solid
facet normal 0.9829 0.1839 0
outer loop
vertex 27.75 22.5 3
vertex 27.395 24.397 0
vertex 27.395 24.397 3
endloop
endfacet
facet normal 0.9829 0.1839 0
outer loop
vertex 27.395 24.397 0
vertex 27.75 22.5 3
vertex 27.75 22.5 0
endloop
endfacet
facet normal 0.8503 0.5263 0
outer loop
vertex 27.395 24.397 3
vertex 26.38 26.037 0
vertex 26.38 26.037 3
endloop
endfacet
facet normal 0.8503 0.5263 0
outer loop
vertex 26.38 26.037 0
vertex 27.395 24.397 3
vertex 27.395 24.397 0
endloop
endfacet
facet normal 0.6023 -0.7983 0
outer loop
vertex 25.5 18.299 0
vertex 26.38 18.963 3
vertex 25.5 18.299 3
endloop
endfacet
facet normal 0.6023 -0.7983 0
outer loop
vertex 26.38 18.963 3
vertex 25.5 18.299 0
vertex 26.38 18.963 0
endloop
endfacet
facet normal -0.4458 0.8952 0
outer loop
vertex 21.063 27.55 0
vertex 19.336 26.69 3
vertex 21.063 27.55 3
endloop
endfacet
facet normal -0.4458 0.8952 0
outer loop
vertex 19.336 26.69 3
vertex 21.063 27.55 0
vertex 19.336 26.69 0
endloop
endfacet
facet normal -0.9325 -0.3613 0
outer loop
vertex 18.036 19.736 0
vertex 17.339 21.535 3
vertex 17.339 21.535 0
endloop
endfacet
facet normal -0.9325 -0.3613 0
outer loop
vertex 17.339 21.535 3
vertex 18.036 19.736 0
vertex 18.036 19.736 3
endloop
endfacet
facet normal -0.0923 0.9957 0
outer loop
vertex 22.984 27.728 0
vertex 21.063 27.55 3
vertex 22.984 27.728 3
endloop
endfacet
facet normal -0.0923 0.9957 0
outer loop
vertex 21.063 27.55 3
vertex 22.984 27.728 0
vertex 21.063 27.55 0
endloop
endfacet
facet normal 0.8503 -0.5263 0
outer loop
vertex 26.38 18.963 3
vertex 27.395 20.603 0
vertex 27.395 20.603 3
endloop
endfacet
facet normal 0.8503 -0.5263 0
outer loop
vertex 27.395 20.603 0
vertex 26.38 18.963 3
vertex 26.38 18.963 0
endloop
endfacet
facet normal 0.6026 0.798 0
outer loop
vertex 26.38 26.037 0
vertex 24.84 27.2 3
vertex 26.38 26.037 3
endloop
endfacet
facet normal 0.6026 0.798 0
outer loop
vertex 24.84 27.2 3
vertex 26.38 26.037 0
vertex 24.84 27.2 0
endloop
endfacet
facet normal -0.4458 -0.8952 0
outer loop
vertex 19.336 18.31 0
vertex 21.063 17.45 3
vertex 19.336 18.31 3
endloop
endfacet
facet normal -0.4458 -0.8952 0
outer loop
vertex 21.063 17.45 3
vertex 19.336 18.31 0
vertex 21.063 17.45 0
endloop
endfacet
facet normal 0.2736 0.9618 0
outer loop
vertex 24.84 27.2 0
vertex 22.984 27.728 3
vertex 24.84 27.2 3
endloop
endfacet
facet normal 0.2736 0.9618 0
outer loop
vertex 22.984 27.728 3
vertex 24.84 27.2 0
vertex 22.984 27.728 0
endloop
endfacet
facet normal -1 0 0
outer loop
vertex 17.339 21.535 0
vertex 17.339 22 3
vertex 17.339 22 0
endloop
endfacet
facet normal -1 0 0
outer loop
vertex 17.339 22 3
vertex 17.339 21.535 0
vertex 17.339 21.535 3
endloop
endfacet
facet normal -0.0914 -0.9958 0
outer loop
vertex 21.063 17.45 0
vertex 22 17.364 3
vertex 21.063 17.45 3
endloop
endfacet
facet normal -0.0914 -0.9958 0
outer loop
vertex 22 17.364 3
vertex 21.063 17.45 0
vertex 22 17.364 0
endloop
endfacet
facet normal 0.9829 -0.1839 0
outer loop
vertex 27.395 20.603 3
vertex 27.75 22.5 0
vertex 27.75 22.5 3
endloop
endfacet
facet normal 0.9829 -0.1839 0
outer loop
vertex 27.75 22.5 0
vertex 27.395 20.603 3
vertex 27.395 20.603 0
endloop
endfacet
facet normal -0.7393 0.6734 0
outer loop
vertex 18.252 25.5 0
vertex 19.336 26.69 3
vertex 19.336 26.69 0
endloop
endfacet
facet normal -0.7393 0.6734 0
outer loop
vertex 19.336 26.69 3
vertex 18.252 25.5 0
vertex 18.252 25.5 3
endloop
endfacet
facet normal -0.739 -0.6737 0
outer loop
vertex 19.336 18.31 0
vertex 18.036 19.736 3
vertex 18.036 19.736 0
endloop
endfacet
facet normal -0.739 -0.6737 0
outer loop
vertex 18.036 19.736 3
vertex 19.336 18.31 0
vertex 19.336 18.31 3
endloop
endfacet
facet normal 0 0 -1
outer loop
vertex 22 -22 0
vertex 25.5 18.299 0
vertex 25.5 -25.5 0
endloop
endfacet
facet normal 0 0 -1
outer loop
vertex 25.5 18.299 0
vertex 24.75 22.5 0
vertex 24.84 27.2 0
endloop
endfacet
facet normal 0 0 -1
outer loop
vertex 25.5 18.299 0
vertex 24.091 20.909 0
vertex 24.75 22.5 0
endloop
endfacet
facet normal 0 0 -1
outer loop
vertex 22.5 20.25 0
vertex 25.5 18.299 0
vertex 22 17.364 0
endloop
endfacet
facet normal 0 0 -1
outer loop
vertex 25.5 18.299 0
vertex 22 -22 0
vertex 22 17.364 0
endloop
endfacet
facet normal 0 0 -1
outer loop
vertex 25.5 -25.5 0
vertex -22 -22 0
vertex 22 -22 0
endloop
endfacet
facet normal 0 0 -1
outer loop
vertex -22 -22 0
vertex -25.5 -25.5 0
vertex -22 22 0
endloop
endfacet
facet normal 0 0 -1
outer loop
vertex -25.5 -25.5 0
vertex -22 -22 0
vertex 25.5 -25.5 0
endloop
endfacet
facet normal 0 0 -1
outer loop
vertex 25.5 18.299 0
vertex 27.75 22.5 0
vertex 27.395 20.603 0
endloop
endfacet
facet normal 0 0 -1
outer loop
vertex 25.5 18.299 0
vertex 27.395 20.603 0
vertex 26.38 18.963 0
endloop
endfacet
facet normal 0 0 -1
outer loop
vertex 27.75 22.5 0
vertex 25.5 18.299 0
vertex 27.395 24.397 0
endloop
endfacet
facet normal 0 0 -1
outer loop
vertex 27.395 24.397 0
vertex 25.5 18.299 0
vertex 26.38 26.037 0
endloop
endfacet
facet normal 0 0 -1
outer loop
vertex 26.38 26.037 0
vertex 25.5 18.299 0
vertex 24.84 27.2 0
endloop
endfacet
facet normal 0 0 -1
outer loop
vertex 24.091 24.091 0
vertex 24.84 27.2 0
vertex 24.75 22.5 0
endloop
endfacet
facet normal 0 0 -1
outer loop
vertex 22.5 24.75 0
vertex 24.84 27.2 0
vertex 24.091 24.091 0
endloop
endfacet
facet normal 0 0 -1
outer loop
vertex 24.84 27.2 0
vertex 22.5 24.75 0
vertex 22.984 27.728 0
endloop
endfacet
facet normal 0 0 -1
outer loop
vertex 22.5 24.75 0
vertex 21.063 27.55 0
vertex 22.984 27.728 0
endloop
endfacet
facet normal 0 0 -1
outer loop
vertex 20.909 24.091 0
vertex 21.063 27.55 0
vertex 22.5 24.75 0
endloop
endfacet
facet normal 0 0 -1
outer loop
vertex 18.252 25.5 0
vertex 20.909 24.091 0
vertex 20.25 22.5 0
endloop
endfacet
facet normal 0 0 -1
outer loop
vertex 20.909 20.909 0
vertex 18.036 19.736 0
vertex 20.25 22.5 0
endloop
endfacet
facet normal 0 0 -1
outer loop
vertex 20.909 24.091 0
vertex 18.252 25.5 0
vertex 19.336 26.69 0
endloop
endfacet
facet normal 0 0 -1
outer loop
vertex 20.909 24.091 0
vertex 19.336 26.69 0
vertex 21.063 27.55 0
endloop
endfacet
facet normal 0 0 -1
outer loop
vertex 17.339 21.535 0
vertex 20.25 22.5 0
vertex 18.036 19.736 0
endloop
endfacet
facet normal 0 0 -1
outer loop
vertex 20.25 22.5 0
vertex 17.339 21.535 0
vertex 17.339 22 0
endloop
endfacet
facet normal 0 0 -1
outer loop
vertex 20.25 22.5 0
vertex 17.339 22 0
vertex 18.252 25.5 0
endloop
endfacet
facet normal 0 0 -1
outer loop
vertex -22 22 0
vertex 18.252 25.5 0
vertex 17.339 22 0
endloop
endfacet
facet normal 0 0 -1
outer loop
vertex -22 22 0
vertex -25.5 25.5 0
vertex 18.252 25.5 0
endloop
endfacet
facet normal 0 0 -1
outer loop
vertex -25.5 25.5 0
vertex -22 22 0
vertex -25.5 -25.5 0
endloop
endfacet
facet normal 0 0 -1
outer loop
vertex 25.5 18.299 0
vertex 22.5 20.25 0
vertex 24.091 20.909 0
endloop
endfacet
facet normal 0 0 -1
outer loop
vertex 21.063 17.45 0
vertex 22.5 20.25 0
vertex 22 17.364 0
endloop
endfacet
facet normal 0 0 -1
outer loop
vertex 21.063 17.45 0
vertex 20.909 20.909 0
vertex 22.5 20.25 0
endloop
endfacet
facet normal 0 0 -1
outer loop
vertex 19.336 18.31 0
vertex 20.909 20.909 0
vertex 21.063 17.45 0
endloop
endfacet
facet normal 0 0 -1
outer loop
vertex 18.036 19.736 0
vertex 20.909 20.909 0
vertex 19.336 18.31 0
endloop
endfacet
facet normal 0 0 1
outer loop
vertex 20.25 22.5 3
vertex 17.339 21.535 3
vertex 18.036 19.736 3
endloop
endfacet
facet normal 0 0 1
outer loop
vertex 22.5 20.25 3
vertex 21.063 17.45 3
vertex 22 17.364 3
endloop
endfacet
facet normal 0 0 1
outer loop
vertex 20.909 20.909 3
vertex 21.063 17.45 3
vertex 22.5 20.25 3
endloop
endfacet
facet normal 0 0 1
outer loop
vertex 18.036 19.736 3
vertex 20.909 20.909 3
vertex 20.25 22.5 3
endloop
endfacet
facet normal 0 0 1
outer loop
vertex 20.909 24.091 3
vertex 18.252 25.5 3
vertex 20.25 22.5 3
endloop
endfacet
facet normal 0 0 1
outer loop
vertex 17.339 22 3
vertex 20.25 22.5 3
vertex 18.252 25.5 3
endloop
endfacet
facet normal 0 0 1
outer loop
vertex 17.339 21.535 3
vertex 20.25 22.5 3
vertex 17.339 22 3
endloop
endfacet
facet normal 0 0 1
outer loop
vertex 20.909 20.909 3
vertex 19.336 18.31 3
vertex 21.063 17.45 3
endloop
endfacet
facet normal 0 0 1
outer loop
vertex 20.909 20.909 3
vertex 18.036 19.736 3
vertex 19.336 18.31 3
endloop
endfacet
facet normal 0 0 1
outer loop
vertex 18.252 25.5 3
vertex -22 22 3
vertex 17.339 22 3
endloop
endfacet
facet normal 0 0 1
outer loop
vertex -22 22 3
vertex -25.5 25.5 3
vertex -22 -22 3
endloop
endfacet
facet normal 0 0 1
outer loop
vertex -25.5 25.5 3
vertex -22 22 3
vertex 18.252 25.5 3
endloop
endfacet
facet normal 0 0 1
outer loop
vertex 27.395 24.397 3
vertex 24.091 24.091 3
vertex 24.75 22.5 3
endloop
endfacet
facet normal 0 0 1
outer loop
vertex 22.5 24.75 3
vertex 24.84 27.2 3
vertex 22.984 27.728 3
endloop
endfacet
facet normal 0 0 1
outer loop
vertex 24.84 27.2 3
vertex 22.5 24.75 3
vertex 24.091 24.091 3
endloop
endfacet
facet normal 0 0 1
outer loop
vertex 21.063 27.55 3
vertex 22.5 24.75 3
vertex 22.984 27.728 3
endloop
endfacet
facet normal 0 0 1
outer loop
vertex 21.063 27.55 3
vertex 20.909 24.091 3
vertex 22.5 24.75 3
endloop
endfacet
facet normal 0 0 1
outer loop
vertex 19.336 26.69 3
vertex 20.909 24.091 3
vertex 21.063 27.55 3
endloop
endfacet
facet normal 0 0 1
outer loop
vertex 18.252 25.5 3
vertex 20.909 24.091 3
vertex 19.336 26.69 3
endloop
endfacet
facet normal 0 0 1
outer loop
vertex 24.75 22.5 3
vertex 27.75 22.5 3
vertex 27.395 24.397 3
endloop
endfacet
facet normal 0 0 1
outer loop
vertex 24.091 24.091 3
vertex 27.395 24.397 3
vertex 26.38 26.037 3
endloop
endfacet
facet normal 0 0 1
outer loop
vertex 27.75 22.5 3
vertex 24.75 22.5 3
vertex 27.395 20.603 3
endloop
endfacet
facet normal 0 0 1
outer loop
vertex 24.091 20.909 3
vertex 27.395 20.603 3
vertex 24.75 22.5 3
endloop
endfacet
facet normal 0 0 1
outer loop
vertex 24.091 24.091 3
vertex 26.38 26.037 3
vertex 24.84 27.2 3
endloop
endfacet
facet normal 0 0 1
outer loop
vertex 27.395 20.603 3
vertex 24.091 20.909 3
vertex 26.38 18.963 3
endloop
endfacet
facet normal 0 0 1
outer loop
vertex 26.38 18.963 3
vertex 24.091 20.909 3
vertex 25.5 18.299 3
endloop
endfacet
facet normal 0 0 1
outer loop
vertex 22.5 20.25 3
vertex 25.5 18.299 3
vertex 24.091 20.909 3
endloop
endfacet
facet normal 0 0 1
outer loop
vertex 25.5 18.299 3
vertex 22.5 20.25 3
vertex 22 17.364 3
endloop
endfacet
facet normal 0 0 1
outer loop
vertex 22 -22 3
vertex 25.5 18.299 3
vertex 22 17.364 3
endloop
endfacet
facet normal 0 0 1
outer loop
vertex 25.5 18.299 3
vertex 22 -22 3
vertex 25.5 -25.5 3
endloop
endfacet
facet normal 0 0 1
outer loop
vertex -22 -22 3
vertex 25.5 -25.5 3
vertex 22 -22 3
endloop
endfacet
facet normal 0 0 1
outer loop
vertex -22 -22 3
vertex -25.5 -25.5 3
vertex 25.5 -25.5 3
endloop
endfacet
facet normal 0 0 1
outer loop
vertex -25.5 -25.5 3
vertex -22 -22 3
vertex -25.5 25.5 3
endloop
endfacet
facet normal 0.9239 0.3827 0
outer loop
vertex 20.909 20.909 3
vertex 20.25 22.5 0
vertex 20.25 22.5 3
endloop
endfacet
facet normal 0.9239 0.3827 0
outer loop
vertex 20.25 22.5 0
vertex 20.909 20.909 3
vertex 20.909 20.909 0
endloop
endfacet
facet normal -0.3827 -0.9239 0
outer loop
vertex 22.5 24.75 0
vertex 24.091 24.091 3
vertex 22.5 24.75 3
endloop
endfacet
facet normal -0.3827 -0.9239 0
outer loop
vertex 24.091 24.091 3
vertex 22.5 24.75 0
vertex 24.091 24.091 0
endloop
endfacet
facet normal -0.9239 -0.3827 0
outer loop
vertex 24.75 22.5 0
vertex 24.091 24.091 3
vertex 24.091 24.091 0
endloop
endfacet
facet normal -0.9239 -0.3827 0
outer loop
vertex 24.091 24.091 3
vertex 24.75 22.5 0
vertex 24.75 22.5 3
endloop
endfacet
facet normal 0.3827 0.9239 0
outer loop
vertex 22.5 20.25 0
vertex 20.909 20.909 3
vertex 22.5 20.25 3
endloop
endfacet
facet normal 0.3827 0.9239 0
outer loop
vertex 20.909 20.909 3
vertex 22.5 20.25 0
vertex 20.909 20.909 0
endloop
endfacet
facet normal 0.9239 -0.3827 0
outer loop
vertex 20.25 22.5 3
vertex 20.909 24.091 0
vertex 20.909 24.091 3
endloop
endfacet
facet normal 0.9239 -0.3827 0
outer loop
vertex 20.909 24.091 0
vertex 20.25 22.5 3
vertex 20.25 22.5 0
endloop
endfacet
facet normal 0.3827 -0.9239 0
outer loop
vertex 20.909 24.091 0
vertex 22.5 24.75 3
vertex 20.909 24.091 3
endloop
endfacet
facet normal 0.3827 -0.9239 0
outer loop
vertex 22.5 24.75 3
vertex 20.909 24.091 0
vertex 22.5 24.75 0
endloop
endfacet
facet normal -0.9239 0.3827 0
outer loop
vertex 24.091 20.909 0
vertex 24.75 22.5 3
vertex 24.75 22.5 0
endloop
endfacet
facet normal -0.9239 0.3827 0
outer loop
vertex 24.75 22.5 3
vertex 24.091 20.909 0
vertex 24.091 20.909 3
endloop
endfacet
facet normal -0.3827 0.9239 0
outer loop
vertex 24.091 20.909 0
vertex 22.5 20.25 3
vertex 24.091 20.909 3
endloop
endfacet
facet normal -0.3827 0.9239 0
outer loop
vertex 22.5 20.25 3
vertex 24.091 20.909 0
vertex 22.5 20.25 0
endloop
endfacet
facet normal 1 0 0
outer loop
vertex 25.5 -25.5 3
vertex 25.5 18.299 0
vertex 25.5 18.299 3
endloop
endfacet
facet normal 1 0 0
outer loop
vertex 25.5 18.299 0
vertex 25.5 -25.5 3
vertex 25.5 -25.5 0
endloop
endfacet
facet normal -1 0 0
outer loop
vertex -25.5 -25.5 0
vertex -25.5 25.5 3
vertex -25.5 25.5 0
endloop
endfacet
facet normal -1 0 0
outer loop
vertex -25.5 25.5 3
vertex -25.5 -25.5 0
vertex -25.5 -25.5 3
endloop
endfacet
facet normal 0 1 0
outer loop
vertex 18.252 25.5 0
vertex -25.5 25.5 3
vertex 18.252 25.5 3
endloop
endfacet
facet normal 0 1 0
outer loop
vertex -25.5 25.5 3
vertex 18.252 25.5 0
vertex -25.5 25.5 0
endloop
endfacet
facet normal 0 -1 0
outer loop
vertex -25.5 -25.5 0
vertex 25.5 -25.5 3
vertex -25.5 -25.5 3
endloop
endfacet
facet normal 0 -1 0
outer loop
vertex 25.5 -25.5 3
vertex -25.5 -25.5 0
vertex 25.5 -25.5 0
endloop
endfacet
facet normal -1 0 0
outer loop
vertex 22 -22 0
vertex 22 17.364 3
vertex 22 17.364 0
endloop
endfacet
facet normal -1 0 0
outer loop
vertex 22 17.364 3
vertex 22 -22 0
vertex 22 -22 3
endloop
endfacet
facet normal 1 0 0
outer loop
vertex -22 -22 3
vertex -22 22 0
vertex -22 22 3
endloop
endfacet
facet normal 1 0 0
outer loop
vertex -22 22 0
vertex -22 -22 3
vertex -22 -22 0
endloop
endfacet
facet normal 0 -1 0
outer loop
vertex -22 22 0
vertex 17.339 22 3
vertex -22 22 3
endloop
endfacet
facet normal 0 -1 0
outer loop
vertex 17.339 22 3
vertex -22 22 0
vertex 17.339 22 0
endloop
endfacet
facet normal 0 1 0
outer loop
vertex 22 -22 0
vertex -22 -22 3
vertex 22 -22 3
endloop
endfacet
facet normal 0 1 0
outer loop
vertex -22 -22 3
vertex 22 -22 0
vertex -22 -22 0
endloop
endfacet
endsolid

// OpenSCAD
//keychain-Customizable Lithopane by Mark G. Peeters 
//http://www.thingiverse.com/thing:308109
//version 1.3 
//if you are using openSCAD then you are cool! You can get DAT files for local use using this tool
//http://customizer.makerbot.com/image_surface
// i used the nice code for adjusting layers from here:
//http://www.thingiverse.com/thing:74322

// preview[view:south, tilt:top]
//
//
/* [Image] */

// Load a 100x100 pixel image.(images will be stretched to fit) Simple photos work best. Don't forget to click the Invert Colors checkbox! *** ALSO IF YOU HAVE LETTERS IN YOUR IMAGE make sure to reverse the image before uploading so the letters are not backwards.
image_file = "image-surface.dat"; // [image_surface:100x100]

/* [Adjustments] */

//shape NOTE: ALL units are in millimeters (mm)
shape = 1;//[0:circle, 1:square]
//over all size of the keychain. you picked
tag_size = 45;// [20:70]
// size for keyring 4.5 or 5 is good.
ring_hole=4.5;
// What layer height will you slice this at?  The thinner the better.
layer_height = 0.1;
//Use plastic color opacity to set this. The lower the layer height, the more layers you can use. you picked
number_of_layers = 20; // [5:30]
//Width of boarder lining the keychain (3mm is fine)
boarder_width = 3;//
//boarder thickness lining the keychain (at least 3mm for strength)
boarder_thick = 3;//

/* [Hidden] */

// base (white) will always be 2 layers thick
min_layer_height = layer_height*2;
height = layer_height*number_of_layers;
maxheight = height+min_layer_height;


// Make litho and trim bottom and sides
  difference() { //diff 1
  translate([0, 0, min_layer_height]) scale([(tag_size/100),(tag_size/100),height]) surface(file=image_file, center=true, convexity=5); //litosurface moved up min_layer_height
  translate([0,0,-(maxheight)]) linear_extrude(height=maxheight) square(tag_size, center=true);//cutting bottom off surface

if (shape==0) {//you picked circle shape------------------------------------
difference() {  //diff make tube to trim lith
                translate([0, 0, -7]) cylinder(maxheight+15,r= tag_size); //outside
                translate([0, 0, -9]) cylinder(maxheight+18,r= (tag_size/2)); //inside
               } //end diff make tube
translate([0, tag_size/2+boarder_width, -1])cylinder(maxheight+2,r= ring_hole/2); //ring hole
}//end if you picked circle------------------------------------------

if (shape==1) {//you picked square shape------------------------------------
difference() {  //diff make cube to trim litho
                translate([0, 0, -7]) cube(tag_size+15,center=true); //outside
               translate([0, 0, -9]) cube(tag_size,center=true); //inside
               } //end diff make tube
translate([tag_size/2, tag_size/2, -1])cylinder(maxheight+2,r= ring_hole/2); //ring hole
}//end if you picked square

}//end diff 1

//add boarder and loop
if (shape==0) {//you picked circle shape--------------------------
translate([0, tag_size/2+boarder_width, 0]) //move loop
difference(){//make loop
cylinder(boarder_thick,r=boarder_width+ring_hole/2); //ring support
translate([0, 0, -1])cylinder(boarder_thick+2,r= ring_hole/2); //ring hole
}

difference() {  //diff make frame tube
                 cylinder(boarder_thick,r= (tag_size/2)+boarder_width); //outside
                 cylinder(boarder_thick+1,r= (tag_size/2.02)); //inside
translate([0, tag_size/2+boarder_width, -1])cylinder(boarder_thick+2,r= ring_hole/2); //ring hole
                } //end diff make frame tube

}//end if you picked circle------------------------------------------

if (shape==1) {//you picked square shape------------------------------------
translate([tag_size/2, tag_size/2, 0]) //move loop
difference(){//make loop
cylinder(boarder_thick,r=boarder_width+ring_hole/2); //ring support
translate([0, 0, -1])cylinder(boarder_thick+2,r= ring_hole/2); //ring hole
}

difference() {  //diff make frame tube
                 translate([0,0,boarder_thick/2]) cube([tag_size+boarder_width*2,tag_size+boarder_width*2,boarder_thick],center=true); //outside
                 translate([0,0,boarder_thick/2]) cube([tag_size-1,tag_size-1,boarder_thick+1],center=true); //inside
translate([tag_size/2, tag_size/2, -1])cylinder(boarder_thick+2,r= ring_hole/2); //ring hole                
                        } //end diff make frame tube
}//end if you picked square------------------------------------------------
